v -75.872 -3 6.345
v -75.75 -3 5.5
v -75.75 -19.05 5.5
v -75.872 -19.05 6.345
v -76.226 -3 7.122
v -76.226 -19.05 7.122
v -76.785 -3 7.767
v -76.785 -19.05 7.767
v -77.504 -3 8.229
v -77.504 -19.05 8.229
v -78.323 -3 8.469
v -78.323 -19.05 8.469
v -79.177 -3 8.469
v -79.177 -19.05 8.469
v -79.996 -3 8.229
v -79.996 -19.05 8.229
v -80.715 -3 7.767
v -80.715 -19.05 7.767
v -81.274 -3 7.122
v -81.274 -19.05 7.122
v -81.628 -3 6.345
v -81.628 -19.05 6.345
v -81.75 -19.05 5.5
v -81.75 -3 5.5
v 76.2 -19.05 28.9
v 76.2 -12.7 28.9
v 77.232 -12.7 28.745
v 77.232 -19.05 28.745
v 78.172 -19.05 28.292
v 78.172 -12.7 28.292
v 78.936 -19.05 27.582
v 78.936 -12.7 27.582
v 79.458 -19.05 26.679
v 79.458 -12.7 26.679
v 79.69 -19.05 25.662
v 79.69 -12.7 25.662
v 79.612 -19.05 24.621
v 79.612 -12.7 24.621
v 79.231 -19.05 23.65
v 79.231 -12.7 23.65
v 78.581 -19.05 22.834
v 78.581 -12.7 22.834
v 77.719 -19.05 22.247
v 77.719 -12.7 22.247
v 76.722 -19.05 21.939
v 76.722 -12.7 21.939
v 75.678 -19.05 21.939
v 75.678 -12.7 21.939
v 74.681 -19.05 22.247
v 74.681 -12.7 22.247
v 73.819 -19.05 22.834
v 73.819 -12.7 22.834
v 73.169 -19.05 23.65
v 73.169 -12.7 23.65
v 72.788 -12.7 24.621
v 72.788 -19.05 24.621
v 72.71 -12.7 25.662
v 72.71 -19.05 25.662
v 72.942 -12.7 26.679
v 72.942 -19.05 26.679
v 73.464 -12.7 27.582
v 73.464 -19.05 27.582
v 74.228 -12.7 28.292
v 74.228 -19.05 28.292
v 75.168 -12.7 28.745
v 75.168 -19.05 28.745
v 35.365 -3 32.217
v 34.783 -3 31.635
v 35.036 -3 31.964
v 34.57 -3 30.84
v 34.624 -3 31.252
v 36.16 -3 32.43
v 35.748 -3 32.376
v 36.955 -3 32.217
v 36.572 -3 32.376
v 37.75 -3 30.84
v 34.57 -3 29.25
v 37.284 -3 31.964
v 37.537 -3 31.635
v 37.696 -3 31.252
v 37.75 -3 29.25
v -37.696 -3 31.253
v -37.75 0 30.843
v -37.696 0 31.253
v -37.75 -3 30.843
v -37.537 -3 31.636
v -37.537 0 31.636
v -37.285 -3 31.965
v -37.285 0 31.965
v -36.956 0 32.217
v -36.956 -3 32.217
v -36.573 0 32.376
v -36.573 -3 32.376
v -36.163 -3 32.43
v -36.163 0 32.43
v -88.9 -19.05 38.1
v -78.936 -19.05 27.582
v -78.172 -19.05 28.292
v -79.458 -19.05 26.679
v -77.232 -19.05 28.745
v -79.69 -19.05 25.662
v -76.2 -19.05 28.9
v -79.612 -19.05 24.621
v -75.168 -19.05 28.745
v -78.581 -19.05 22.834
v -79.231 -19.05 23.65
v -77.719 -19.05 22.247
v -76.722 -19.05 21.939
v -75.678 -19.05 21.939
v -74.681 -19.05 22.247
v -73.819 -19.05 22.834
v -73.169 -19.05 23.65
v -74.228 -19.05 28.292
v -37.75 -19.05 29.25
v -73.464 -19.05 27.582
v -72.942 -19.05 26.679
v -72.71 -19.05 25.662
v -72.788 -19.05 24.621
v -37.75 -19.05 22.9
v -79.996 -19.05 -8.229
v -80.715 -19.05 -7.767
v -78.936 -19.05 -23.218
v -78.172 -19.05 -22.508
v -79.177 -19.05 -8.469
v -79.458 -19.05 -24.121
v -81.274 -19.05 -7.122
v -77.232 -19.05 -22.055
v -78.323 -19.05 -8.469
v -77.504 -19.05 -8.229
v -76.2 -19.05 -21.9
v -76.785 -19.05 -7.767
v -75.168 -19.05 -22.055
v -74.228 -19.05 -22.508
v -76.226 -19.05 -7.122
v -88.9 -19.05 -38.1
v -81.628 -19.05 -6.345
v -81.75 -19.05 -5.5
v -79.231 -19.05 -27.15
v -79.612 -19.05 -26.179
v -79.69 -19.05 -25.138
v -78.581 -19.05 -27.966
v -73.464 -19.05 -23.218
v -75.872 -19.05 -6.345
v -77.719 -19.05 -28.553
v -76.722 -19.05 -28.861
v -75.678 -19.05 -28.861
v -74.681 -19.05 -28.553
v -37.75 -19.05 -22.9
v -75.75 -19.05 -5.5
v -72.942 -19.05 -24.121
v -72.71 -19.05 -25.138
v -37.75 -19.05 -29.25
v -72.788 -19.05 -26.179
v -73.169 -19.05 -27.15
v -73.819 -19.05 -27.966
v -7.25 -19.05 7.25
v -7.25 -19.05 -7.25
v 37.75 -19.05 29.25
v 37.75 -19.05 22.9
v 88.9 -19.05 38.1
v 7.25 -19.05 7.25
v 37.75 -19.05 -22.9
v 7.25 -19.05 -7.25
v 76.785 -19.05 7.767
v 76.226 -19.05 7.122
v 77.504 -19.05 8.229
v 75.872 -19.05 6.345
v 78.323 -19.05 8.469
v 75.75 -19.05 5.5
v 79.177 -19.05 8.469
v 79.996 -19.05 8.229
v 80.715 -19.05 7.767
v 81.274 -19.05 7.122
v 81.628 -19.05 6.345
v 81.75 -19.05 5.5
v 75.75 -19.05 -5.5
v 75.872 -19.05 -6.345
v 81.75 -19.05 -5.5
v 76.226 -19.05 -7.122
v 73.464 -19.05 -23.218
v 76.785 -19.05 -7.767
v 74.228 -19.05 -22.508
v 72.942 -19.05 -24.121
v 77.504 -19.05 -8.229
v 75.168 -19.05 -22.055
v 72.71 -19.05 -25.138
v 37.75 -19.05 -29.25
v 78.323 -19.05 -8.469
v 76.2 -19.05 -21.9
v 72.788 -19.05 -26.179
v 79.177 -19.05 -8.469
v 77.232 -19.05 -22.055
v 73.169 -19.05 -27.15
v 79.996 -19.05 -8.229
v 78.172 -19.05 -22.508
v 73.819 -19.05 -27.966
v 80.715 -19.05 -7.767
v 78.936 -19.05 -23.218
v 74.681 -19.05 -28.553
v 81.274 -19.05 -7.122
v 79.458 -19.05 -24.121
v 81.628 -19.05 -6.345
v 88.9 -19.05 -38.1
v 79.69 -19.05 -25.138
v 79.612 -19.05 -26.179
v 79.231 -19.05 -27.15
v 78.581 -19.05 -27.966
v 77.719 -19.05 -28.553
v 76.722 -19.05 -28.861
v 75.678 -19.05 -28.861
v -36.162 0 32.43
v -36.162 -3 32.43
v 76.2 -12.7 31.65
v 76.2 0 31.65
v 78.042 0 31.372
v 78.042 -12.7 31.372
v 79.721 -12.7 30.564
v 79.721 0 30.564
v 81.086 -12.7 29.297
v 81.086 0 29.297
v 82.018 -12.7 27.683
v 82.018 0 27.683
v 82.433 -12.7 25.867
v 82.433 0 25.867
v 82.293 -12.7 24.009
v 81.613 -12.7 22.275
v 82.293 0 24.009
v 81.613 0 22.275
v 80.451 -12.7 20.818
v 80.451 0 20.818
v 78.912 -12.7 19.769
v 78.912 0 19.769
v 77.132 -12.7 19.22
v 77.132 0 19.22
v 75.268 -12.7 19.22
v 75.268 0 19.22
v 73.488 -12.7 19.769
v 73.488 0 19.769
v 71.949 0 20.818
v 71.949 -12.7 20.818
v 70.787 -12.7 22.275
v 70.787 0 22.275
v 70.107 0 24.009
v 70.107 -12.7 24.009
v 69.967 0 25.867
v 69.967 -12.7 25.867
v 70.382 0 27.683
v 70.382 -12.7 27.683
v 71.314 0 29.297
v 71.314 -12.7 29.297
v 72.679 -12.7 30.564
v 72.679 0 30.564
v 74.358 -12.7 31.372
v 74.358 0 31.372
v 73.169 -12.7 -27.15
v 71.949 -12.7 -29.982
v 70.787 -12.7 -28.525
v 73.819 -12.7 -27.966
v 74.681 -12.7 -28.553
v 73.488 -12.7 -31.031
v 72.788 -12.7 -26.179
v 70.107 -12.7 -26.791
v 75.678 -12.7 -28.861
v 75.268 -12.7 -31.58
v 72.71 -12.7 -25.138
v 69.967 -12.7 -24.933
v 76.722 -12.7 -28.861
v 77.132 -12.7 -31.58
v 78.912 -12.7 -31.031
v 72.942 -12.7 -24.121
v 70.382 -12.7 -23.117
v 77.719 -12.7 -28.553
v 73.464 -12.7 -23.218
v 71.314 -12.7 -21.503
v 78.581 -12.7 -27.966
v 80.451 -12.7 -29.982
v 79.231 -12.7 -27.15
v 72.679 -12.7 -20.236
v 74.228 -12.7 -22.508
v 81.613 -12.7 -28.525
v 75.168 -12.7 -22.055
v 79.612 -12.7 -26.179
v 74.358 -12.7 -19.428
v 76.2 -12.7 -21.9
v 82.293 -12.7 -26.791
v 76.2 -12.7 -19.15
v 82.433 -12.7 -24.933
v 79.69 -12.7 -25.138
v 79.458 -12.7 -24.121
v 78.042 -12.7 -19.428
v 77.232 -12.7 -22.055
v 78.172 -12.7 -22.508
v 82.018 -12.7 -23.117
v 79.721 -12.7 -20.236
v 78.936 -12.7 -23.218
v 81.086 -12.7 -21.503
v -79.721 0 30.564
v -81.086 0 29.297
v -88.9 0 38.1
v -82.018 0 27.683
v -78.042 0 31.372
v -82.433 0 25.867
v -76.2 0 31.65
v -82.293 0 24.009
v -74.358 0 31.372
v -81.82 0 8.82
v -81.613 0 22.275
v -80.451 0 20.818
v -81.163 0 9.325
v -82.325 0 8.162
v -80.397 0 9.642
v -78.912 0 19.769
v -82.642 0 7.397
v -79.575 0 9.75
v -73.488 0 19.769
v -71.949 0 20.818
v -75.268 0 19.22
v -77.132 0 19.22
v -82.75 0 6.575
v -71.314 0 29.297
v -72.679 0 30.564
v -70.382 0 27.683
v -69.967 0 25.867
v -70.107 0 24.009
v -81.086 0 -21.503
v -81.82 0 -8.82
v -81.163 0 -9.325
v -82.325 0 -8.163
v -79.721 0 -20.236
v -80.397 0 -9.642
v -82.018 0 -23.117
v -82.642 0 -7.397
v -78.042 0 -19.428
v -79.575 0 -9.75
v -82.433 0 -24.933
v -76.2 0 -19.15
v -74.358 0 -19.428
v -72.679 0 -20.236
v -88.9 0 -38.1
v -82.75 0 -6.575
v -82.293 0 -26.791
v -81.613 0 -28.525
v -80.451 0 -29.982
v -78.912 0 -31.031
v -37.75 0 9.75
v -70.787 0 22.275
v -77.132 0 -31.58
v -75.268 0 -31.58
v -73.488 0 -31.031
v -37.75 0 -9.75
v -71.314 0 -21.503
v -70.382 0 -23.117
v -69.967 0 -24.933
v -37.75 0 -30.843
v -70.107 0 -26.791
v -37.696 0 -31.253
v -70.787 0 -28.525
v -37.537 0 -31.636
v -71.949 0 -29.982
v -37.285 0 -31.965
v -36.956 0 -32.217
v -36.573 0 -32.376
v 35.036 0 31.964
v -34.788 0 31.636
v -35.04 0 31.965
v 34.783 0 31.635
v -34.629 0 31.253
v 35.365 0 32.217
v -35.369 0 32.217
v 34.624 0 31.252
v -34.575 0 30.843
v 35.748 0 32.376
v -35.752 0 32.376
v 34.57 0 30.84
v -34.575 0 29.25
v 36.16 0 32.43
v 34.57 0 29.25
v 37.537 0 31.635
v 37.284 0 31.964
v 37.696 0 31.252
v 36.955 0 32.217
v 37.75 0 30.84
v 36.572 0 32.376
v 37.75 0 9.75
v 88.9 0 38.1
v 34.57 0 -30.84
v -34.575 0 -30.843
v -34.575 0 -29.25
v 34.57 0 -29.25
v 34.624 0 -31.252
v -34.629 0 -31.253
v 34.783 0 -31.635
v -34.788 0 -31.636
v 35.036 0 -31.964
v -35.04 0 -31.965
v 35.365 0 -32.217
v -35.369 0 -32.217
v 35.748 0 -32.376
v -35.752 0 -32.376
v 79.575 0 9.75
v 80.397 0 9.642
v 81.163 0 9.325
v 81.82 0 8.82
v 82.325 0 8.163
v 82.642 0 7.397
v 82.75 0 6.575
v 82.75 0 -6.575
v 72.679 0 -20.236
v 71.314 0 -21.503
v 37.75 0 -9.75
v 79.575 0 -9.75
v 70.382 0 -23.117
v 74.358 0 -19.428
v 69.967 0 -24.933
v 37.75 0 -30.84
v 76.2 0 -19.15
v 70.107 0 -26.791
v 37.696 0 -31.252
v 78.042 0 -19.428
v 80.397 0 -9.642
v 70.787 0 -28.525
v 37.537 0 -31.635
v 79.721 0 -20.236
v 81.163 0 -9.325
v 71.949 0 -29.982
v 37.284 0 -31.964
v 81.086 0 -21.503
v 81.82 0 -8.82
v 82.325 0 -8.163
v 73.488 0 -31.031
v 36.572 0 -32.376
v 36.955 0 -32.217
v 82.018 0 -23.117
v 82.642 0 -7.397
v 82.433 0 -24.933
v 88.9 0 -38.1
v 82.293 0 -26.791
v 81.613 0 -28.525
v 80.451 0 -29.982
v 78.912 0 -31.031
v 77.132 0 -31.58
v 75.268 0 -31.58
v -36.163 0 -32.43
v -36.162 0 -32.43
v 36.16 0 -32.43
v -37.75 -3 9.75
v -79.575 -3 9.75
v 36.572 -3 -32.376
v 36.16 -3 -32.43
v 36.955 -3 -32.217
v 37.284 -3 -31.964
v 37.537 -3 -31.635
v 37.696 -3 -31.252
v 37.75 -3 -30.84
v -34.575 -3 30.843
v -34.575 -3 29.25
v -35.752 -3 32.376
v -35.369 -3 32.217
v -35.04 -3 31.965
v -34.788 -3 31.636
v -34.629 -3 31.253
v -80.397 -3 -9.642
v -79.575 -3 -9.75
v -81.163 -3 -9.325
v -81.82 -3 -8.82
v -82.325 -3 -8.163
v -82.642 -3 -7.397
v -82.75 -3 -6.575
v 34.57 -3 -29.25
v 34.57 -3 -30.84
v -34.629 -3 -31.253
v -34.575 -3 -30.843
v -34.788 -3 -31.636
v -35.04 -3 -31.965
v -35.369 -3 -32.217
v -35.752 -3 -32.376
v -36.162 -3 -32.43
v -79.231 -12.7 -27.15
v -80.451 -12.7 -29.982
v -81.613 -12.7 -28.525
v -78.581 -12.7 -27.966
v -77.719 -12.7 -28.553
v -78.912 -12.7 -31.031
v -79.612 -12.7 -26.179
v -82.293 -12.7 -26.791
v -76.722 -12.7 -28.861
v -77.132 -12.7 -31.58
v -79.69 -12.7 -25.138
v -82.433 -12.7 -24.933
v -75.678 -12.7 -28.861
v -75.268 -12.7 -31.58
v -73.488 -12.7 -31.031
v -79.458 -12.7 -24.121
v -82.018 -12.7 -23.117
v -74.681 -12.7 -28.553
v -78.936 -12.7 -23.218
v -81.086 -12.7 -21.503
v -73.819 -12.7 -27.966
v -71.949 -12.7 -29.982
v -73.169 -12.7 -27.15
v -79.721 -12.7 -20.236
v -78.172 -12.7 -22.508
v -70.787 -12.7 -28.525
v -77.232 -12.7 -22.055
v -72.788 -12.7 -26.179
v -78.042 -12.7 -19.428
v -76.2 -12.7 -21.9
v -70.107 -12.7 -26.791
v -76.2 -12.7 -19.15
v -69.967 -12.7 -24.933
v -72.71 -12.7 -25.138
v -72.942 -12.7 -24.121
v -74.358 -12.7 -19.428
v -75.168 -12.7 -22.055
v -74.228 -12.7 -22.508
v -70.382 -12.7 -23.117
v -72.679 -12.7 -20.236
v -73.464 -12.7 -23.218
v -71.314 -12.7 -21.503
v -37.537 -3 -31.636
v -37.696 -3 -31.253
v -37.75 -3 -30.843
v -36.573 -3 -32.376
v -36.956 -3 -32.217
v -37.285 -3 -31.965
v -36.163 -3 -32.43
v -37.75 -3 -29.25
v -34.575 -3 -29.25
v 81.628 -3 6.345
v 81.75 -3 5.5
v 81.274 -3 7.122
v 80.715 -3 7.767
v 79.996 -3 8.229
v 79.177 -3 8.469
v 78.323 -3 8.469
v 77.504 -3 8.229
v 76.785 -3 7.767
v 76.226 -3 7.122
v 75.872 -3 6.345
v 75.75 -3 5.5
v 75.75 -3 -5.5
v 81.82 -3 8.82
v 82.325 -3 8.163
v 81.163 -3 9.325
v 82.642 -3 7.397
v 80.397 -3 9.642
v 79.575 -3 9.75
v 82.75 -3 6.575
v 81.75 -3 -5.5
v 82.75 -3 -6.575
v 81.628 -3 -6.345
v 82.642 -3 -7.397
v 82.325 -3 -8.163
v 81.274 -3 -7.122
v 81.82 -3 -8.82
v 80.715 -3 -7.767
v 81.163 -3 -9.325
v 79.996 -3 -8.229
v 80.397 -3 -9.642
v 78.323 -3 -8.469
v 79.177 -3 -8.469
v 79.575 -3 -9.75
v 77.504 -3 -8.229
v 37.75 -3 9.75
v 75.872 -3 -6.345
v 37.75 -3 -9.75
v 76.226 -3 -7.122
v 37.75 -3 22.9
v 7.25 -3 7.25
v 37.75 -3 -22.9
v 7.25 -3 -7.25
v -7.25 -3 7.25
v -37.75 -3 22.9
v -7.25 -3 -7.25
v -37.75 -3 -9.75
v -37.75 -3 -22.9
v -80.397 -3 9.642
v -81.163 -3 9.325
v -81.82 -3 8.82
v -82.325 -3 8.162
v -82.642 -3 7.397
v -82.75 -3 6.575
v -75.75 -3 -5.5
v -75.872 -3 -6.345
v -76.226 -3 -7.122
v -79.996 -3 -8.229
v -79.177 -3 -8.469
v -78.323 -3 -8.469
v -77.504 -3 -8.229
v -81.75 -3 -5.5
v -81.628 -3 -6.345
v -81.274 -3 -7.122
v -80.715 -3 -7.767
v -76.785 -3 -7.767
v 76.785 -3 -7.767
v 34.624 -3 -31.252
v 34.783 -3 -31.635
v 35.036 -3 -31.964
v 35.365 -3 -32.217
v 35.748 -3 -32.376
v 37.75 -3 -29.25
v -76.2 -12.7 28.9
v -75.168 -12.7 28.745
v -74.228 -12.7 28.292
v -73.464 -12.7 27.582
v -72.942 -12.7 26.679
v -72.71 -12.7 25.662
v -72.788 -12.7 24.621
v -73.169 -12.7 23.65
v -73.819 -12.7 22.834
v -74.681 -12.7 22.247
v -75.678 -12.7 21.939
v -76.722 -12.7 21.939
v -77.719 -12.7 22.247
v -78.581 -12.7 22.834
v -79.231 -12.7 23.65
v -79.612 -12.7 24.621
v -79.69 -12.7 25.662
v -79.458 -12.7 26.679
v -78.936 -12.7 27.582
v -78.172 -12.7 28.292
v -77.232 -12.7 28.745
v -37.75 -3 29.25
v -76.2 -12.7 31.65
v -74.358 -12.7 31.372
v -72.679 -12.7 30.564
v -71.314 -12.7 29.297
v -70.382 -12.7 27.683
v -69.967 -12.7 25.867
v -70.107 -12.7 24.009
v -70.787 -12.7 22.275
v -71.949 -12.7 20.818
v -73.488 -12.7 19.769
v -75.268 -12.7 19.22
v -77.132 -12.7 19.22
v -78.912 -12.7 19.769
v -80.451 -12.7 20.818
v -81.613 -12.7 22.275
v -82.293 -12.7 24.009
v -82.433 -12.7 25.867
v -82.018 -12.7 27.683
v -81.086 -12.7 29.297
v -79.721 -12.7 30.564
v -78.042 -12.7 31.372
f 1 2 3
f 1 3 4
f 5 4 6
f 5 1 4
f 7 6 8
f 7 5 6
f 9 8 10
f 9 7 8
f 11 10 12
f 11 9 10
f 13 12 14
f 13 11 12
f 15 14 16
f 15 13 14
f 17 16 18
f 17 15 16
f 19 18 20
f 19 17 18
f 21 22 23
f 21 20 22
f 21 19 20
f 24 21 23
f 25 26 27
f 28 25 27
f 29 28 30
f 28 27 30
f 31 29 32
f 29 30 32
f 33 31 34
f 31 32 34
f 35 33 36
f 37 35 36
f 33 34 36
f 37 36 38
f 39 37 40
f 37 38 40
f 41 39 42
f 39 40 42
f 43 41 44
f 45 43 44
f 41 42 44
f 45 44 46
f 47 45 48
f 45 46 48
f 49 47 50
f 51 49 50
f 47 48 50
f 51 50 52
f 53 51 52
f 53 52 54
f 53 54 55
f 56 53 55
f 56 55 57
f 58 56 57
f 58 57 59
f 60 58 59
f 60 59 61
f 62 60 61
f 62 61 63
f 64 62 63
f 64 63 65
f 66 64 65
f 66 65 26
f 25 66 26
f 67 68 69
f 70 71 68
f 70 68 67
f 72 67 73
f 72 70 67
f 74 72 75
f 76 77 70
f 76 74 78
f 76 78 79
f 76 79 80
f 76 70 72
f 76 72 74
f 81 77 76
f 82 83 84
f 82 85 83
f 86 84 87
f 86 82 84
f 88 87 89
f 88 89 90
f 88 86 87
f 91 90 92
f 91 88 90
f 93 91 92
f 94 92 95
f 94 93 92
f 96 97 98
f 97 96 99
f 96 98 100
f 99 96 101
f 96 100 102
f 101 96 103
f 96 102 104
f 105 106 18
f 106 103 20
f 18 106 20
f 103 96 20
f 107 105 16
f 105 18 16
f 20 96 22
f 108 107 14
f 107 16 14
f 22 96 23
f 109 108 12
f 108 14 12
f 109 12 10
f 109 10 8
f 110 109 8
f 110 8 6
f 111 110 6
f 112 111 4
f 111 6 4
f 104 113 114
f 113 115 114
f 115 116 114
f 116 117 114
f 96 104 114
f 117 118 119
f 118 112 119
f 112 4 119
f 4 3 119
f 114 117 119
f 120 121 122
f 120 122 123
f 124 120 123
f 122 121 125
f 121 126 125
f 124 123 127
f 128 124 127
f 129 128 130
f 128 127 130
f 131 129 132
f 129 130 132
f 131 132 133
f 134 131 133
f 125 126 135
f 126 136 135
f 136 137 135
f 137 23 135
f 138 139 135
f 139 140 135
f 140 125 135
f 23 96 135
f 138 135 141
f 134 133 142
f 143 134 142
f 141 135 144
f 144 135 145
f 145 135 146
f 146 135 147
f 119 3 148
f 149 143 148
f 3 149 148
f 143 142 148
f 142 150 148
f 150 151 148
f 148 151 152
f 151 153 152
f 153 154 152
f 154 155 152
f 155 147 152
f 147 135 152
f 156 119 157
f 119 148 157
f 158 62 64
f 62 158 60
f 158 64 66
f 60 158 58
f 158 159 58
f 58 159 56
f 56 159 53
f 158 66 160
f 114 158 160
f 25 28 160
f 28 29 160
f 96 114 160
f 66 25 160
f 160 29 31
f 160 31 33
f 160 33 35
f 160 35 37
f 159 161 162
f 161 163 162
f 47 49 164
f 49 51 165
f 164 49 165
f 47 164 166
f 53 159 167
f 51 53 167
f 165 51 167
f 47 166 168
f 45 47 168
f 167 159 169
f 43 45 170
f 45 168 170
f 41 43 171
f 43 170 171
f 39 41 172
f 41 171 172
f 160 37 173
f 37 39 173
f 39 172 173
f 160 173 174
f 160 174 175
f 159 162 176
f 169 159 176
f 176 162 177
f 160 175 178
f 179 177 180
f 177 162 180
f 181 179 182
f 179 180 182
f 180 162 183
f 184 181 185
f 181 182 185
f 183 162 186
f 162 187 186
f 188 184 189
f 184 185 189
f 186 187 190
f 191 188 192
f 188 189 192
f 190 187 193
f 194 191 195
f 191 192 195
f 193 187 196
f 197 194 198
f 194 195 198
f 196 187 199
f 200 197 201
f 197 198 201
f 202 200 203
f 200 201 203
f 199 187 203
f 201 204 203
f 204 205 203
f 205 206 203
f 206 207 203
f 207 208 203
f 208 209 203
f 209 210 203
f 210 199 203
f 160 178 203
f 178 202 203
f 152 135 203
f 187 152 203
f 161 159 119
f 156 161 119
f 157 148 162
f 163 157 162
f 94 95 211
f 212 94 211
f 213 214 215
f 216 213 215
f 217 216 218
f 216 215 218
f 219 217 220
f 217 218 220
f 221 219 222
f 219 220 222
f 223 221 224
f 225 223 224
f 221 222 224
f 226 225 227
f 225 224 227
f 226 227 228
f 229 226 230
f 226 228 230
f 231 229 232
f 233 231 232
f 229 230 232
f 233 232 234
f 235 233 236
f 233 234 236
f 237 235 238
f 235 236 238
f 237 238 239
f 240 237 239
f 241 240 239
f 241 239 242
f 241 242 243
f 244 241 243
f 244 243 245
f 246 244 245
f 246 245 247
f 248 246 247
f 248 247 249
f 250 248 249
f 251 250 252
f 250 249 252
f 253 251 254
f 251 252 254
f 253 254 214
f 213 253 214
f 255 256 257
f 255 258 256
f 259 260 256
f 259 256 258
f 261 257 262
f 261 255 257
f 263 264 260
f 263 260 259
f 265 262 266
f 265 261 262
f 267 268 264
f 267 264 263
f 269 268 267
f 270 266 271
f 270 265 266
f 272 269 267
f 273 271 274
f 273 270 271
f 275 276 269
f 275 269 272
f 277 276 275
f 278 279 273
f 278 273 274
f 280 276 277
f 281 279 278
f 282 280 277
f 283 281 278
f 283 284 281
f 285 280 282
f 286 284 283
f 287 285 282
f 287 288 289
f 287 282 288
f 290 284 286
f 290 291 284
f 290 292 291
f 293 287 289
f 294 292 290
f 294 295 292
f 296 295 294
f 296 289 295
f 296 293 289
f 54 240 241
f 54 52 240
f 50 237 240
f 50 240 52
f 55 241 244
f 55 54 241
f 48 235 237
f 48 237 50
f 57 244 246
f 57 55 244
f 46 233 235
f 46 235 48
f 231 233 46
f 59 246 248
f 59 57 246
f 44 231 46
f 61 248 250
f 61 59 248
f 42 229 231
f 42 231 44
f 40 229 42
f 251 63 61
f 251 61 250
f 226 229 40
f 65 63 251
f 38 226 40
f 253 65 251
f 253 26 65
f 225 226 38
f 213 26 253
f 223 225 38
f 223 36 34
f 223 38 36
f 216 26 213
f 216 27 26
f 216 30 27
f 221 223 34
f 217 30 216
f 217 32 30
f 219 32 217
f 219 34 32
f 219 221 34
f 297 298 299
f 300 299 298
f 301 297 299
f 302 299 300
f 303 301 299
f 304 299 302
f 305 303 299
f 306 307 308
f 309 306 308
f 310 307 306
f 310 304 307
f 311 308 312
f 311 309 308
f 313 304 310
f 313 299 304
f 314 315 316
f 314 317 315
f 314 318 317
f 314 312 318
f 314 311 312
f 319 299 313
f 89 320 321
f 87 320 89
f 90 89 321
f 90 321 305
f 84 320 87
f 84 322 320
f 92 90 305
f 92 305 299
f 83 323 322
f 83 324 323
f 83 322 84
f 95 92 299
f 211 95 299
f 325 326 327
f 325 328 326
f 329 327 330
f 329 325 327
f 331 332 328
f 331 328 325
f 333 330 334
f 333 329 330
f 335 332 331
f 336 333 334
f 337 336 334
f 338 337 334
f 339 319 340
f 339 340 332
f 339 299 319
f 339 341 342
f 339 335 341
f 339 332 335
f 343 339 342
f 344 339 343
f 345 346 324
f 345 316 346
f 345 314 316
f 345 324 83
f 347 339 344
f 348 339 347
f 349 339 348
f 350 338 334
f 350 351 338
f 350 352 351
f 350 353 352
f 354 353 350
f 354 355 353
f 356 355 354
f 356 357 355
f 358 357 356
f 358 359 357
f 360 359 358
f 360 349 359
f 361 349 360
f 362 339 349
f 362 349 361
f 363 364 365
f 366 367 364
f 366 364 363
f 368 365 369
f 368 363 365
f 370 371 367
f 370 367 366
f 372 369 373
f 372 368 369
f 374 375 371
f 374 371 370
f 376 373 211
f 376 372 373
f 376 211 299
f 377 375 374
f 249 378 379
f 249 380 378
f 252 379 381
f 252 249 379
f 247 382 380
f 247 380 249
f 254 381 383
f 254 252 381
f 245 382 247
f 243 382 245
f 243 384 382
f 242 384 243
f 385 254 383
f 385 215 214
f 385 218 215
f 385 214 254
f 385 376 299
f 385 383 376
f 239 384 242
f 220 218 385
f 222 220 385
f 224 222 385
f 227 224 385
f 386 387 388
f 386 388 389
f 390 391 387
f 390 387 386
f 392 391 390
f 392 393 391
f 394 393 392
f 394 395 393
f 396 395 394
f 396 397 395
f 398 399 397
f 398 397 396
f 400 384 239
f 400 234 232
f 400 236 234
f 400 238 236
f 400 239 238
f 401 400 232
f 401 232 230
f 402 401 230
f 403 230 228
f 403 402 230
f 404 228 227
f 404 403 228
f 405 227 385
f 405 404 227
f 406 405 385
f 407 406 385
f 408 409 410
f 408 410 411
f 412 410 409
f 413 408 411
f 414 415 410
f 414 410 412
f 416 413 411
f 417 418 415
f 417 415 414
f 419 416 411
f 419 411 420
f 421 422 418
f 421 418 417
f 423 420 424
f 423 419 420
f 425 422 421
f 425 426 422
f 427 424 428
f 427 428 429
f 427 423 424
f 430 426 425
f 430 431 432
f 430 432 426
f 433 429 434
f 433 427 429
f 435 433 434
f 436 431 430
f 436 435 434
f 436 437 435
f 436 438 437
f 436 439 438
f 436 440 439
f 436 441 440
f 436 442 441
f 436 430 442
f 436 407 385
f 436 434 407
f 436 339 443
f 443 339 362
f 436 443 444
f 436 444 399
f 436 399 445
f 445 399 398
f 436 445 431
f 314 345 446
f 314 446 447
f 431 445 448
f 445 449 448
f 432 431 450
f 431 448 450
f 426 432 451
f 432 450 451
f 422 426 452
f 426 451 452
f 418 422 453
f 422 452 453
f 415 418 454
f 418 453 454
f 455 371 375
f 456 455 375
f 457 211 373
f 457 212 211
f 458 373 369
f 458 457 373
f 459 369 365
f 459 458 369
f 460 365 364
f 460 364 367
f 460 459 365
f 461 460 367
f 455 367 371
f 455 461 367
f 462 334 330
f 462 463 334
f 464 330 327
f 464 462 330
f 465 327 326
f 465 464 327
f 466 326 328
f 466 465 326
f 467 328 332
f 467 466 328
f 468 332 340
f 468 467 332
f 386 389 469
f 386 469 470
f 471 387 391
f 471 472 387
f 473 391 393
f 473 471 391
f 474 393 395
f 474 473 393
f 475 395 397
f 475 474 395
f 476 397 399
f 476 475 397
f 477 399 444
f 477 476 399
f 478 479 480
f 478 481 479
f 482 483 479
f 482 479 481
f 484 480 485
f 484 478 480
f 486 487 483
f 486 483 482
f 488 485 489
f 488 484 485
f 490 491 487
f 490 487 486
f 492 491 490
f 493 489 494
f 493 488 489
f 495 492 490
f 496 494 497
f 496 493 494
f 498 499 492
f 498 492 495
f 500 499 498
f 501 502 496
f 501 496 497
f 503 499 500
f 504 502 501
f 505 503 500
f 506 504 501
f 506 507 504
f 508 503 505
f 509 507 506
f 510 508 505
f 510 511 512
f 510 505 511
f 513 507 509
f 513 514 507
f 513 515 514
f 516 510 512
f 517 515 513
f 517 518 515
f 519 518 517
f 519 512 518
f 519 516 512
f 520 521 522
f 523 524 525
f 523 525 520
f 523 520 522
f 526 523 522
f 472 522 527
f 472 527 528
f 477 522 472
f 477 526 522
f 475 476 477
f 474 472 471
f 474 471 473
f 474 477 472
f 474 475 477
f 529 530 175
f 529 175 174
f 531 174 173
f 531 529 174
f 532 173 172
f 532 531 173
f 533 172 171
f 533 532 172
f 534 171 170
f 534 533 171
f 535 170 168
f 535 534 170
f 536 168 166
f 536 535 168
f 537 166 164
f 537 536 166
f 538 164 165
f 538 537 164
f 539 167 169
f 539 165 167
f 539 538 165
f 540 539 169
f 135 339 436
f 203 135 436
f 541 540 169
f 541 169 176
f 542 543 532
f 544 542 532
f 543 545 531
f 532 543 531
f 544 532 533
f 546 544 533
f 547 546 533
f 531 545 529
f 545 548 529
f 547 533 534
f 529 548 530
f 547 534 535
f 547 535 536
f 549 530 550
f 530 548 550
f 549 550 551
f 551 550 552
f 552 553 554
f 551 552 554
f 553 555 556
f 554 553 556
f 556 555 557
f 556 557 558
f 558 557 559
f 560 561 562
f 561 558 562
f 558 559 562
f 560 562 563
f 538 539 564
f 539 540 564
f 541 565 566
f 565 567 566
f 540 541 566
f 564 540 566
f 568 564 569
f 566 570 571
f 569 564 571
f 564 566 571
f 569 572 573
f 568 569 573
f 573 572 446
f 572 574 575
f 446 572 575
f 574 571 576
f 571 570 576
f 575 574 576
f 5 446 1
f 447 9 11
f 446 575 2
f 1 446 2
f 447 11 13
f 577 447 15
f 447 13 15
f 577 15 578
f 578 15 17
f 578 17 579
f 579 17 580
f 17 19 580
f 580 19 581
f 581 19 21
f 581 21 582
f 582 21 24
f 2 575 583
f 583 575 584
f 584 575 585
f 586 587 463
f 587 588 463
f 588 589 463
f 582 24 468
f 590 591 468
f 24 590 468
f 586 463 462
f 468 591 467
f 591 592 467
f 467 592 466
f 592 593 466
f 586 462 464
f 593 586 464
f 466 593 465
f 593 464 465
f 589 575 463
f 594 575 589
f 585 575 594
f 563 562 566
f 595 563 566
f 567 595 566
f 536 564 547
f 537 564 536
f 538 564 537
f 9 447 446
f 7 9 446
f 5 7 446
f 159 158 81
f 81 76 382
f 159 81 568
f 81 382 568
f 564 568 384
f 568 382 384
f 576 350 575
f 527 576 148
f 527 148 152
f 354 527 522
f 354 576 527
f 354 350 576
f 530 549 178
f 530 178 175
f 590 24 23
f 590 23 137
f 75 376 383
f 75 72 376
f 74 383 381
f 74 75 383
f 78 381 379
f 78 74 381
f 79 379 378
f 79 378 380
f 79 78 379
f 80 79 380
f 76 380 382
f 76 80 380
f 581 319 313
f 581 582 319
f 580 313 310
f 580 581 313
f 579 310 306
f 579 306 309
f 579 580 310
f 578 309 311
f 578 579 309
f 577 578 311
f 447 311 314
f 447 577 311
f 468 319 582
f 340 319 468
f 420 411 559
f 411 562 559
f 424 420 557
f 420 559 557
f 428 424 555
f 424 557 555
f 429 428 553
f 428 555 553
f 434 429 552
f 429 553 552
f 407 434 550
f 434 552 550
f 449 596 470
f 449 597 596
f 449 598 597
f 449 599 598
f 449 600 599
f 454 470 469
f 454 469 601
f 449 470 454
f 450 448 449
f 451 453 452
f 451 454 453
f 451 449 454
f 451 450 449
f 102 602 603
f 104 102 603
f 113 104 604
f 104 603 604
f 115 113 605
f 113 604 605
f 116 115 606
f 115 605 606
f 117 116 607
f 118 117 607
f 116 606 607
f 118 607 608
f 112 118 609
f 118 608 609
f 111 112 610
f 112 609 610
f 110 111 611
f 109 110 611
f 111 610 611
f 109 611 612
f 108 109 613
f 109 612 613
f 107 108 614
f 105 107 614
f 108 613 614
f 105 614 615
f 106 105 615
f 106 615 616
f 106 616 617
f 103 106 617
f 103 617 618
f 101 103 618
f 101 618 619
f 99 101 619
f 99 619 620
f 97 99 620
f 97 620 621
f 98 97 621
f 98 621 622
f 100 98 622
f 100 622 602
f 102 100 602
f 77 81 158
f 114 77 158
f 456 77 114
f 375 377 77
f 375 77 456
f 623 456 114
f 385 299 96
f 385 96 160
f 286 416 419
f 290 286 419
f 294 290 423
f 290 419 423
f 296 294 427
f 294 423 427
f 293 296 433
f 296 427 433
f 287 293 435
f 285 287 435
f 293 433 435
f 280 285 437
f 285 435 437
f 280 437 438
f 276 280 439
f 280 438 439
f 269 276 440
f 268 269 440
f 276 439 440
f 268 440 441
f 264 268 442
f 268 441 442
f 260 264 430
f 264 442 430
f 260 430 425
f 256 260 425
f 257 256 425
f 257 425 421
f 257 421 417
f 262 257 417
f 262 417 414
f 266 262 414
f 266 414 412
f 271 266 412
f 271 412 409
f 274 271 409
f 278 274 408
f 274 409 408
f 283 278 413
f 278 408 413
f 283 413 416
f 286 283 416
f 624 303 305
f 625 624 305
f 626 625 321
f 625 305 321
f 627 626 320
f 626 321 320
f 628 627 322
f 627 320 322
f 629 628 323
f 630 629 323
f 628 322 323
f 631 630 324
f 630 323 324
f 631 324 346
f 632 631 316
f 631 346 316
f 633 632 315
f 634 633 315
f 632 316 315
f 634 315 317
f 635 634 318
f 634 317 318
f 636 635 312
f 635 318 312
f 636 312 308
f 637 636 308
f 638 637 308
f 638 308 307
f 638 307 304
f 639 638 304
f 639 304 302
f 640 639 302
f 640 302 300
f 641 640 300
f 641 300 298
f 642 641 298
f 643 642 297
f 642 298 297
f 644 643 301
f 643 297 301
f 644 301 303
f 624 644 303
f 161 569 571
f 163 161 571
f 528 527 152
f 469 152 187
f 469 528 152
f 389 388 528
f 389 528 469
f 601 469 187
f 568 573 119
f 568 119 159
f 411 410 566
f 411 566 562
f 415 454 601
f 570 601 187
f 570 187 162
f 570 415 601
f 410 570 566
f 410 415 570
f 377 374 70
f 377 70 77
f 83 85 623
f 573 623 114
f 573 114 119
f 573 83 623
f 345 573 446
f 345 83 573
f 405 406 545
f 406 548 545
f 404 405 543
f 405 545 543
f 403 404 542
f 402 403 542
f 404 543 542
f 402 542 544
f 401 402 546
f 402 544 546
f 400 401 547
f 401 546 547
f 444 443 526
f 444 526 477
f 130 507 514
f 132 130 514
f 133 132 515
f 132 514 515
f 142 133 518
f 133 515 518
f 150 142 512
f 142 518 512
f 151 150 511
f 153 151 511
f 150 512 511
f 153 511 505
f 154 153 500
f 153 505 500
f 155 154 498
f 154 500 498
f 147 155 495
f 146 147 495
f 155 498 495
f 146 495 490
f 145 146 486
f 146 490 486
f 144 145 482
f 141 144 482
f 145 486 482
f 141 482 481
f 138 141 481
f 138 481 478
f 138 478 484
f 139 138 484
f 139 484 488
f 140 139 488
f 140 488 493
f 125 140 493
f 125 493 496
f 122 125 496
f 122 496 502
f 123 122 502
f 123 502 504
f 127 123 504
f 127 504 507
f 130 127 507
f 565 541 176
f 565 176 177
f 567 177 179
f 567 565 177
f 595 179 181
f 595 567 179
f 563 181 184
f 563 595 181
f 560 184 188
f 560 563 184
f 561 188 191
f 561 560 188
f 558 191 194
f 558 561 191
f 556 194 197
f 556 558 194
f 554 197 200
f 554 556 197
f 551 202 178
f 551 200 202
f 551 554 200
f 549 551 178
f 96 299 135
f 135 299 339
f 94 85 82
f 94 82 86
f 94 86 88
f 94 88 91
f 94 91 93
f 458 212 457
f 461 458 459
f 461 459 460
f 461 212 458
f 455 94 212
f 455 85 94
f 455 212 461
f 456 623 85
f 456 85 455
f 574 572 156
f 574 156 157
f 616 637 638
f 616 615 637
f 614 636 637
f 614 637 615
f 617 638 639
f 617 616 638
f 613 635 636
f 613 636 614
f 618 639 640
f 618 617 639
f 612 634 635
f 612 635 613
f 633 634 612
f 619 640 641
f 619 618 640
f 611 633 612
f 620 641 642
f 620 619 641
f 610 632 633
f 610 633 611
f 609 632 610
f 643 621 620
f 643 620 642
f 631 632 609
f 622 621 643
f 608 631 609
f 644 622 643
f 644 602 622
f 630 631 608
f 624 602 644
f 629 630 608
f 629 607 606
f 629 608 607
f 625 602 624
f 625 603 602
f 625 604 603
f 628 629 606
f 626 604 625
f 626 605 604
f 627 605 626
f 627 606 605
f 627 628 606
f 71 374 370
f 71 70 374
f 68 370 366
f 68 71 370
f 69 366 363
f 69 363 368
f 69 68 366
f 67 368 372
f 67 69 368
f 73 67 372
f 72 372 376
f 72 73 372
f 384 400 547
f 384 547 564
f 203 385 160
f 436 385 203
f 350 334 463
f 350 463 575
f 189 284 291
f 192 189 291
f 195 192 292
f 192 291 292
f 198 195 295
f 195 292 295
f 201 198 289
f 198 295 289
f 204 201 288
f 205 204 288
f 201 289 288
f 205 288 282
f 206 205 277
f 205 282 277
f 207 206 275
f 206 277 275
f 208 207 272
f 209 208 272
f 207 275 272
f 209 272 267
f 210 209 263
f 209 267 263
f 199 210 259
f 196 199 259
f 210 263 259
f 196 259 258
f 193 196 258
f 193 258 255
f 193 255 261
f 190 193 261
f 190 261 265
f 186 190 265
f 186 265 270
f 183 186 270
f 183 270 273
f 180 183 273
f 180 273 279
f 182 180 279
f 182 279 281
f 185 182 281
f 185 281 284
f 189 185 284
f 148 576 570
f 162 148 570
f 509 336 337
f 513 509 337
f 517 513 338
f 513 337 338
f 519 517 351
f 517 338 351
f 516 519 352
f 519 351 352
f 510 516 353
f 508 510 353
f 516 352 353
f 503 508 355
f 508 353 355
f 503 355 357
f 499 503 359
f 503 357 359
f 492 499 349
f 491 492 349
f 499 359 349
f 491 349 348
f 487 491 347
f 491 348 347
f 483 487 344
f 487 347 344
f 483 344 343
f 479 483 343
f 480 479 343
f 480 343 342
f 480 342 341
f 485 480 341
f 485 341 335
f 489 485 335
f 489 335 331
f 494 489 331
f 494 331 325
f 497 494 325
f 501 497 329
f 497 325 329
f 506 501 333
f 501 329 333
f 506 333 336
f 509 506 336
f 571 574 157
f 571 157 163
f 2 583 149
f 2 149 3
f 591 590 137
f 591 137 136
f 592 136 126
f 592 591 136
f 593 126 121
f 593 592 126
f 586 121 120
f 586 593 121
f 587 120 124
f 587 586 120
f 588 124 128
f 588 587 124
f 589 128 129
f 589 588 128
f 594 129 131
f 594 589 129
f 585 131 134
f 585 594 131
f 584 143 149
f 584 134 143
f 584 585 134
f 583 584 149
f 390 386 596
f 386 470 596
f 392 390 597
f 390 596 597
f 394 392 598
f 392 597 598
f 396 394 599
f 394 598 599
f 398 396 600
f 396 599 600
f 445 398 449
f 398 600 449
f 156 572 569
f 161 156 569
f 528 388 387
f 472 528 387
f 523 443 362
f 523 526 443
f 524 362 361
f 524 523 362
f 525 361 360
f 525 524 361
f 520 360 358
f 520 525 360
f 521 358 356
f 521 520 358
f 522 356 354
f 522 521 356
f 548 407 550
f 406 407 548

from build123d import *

# Parameters (mm, degrees)
SKETCH1_W           = 177.8
SKETCH1_H           = 76.2
BOSS_EXTRUDE1_DEPTH = 19.05
CUT_EXTRUDE1_DEPTH  = 3
SKETCH3_W           = 14.5
SKETCH3_H           = 14.5
SKETCH3_W_2         = 75.5
SKETCH3_H_2         = 6.35
CUT_EXTRUDE2_DEPTH  = 99.042962522
SKETCH4_R           = 3.5
CUT_EXTRUDE3_DEPTH  = 99.578509321
FILLET1_R           = 3.175
SKETCH5_R           = 6.25
CUT_EXTRUDE4_DEPTH  = 12.7
SKETCH6_W           = 3.175
SKETCH6_H           = 3.18
SKETCH6_W_2         = 3.18
CUT_EXTRUDE5_DEPTH  = 3
FILLET2_R           = 1.5875
FILLET3_R           = 1.59
FILLET4_R           = 1.5875
FILLET5_R           = 1.59
CUT_EXTRUDE6_DEPTH  = 35
CUT_EXTRUDE7_DEPTH  = 35


with BuildPart() as part:
    # Sketch1 → Boss-Extrude1 (new body)
    with BuildSketch(Plane(origin=(0, 0, 0), x_dir=(1, 0, 0), z_dir=(0, 1, 0))):
        Rectangle(SKETCH1_W, SKETCH1_H)
    extrude(amount=-BOSS_EXTRUDE1_DEPTH)

    # Sketch2 → Cut-Extrude1 (cut)
    with BuildSketch(Plane(origin=(0, 0, 0), x_dir=(1, 0, 0), z_dir=(0, 1, 0))):
        Polygon((37.75, 9.75), (82.75, 9.75), (82.75, -9.75), (37.75, -9.75), (37.75, -29.25), (-37.75, -29.25), (-37.75, -9.75), (-82.75, -9.75), (-82.75, 9.75), (-37.75, 9.75), (-37.75, 29.25), (37.75, 29.25), align=None)
    extrude(amount=-CUT_EXTRUDE1_DEPTH, mode=Mode.SUBTRACT)

    # Sketch3 → Cut-Extrude2 (cut, through all)
    with BuildSketch(Plane(origin=(0, -3, 0), x_dir=(1, 0, 0), z_dir=(0, 1, 0))):
        Rectangle(SKETCH3_W, SKETCH3_H)
        with Locations((0, 26.075)):
            Rectangle(SKETCH3_W_2, SKETCH3_H_2)
        with Locations((0, -26.075)):
            Rectangle(SKETCH3_W_2, SKETCH3_H_2)
    extrude(amount=-CUT_EXTRUDE2_DEPTH, mode=Mode.SUBTRACT)

    # Sketch4 → Cut-Extrude3 (cut, through all)
    with BuildSketch(Plane(origin=(0, 0, 0), x_dir=(1, 0, 0), z_dir=(0, 1, 0))):
        with Locations(Location((-76.2, 25.4, 0), (0, 0, 270))):
            Circle(SKETCH4_R)
        with Locations(Location((76.2, 25.4, 0), (0, 0, 270))):
            Circle(SKETCH4_R)
        with Locations(Location((76.2, -25.4, 0), (0, 0, 270))):
            Circle(SKETCH4_R)
        with Locations(Location((-76.2, -25.4, 0), (0, 0, 270))):
            Circle(SKETCH4_R)
    extrude(amount=-CUT_EXTRUDE3_DEPTH, mode=Mode.SUBTRACT)

    # Fillet1
    fillet1_edges = [part.edges().sort_by_distance(p)[0] for p in [
        (82.75, -1.5, -9.75),
        (82.75, -1.5, 9.75),
        (-82.75, -1.5, 9.75),
        (-82.75, -1.5, -9.75),
    ]]
    fillet(fillet1_edges, radius=FILLET1_R)

    # Sketch5 → Cut-Extrude4 (cut)
    with BuildSketch(Plane(origin=(0, 0, 0), x_dir=(1, 0, 0), z_dir=(0, 1, 0))):
        with Locations(Location((-76.2, -25.4, 0), (0, 0, 270))):
            Circle(SKETCH5_R)
        with Locations(Location((-76.2, 25.4, 0), (0, 0, 270))):
            Circle(SKETCH5_R)
        with Locations(Location((76.2, 25.4, 0), (0, 0, 270))):
            Circle(SKETCH5_R)
        with Locations(Location((76.2, -25.4, 0), (0, 0, 270))):
            Circle(SKETCH5_R)
    extrude(amount=-CUT_EXTRUDE4_DEPTH, mode=Mode.SUBTRACT)

    # Sketch6 → Cut-Extrude5 (cut)
    with BuildSketch(Plane(origin=(0, 0, 0), x_dir=(1, 0, 0), z_dir=(0, 1, 0))):
        with Locations((-36.1625, 30.84)):
            Rectangle(SKETCH6_W, SKETCH6_H)
        with Locations((36.16, 30.84)):
            Rectangle(SKETCH6_W_2, SKETCH6_H)
        with Locations((36.16, -30.84)):
            Rectangle(SKETCH6_W_2, SKETCH6_H)
        with Locations((-36.1625, -30.84)):
            Rectangle(SKETCH6_W, SKETCH6_H)
    extrude(amount=-CUT_EXTRUDE5_DEPTH, mode=Mode.SUBTRACT)

    # Fillet2
    fillet2_edges = [part.edges().sort_by_distance(p)[0] for p in [
        (-37.75, -1.5, -32.43),
        (-34.575, -1.5, -32.43),
    ]]
    fillet(fillet2_edges, radius=FILLET2_R - 0.0001)  # a hair under: the kernel refuses the full size

    # Fillet3
    fillet3_edges = [part.edges().sort_by_distance(p)[0] for p in [
        (37.75, -1.5, -32.43),
        (34.57, -1.5, -32.43),
    ]]
    fillet(fillet3_edges, radius=FILLET3_R - 0.0001)  # a hair under: the kernel refuses the full size

    # Fillet4
    fillet4_edges = [part.edges().sort_by_distance(p)[0] for p in [
        (-37.75, -1.5, 32.43),
        (-34.575, -1.5, 32.43),
    ]]
    fillet(fillet4_edges, radius=FILLET4_R - 0.0001)  # a hair under: the kernel refuses the full size

    # Fillet5
    fillet5_edges = [part.edges().sort_by_distance(p)[0] for p in [
        (37.75, -1.5, 32.43),
        (34.57, -1.5, 32.43),
    ]]
    fillet(fillet5_edges, radius=FILLET5_R - 0.0001)  # a hair under: the kernel refuses the full size

    # Sketch8 → Cut-Extrude6 (cut)
    with BuildSketch(Plane(origin=(0, -3, 0), x_dir=(1, 0, 0), z_dir=(0, 1, 0))):
        with BuildLine():
            Line((-75.75, 5.5), (-75.75, -5.5))
            ThreePointArc((-75.75, -5.5), (-78.75, -8.5), (-81.75, -5.5))
            Line((-81.75, -5.5), (-81.75, 5.5))
            ThreePointArc((-81.75, 5.5), (-78.75, 8.5), (-75.75, 5.5))
        make_face()
    extrude(amount=-CUT_EXTRUDE6_DEPTH, mode=Mode.SUBTRACT)

    # Sketch9 → Cut-Extrude7 (cut)
    with BuildSketch(Plane(origin=(0, -3, 0), x_dir=(1, 0, 0), z_dir=(0, 1, 0))):
        with BuildLine():
            Line((81.75, 5.5), (81.75, -5.5))
            ThreePointArc((81.75, -5.5), (78.75, -8.5), (75.75, -5.5))
            Line((75.75, -5.5), (75.75, 5.5))
            ThreePointArc((75.75, 5.5), (78.75, 8.5), (81.75, 5.5))
        make_face()
    extrude(amount=-CUT_EXTRUDE7_DEPTH, mode=Mode.SUBTRACT)


solid = part.part
